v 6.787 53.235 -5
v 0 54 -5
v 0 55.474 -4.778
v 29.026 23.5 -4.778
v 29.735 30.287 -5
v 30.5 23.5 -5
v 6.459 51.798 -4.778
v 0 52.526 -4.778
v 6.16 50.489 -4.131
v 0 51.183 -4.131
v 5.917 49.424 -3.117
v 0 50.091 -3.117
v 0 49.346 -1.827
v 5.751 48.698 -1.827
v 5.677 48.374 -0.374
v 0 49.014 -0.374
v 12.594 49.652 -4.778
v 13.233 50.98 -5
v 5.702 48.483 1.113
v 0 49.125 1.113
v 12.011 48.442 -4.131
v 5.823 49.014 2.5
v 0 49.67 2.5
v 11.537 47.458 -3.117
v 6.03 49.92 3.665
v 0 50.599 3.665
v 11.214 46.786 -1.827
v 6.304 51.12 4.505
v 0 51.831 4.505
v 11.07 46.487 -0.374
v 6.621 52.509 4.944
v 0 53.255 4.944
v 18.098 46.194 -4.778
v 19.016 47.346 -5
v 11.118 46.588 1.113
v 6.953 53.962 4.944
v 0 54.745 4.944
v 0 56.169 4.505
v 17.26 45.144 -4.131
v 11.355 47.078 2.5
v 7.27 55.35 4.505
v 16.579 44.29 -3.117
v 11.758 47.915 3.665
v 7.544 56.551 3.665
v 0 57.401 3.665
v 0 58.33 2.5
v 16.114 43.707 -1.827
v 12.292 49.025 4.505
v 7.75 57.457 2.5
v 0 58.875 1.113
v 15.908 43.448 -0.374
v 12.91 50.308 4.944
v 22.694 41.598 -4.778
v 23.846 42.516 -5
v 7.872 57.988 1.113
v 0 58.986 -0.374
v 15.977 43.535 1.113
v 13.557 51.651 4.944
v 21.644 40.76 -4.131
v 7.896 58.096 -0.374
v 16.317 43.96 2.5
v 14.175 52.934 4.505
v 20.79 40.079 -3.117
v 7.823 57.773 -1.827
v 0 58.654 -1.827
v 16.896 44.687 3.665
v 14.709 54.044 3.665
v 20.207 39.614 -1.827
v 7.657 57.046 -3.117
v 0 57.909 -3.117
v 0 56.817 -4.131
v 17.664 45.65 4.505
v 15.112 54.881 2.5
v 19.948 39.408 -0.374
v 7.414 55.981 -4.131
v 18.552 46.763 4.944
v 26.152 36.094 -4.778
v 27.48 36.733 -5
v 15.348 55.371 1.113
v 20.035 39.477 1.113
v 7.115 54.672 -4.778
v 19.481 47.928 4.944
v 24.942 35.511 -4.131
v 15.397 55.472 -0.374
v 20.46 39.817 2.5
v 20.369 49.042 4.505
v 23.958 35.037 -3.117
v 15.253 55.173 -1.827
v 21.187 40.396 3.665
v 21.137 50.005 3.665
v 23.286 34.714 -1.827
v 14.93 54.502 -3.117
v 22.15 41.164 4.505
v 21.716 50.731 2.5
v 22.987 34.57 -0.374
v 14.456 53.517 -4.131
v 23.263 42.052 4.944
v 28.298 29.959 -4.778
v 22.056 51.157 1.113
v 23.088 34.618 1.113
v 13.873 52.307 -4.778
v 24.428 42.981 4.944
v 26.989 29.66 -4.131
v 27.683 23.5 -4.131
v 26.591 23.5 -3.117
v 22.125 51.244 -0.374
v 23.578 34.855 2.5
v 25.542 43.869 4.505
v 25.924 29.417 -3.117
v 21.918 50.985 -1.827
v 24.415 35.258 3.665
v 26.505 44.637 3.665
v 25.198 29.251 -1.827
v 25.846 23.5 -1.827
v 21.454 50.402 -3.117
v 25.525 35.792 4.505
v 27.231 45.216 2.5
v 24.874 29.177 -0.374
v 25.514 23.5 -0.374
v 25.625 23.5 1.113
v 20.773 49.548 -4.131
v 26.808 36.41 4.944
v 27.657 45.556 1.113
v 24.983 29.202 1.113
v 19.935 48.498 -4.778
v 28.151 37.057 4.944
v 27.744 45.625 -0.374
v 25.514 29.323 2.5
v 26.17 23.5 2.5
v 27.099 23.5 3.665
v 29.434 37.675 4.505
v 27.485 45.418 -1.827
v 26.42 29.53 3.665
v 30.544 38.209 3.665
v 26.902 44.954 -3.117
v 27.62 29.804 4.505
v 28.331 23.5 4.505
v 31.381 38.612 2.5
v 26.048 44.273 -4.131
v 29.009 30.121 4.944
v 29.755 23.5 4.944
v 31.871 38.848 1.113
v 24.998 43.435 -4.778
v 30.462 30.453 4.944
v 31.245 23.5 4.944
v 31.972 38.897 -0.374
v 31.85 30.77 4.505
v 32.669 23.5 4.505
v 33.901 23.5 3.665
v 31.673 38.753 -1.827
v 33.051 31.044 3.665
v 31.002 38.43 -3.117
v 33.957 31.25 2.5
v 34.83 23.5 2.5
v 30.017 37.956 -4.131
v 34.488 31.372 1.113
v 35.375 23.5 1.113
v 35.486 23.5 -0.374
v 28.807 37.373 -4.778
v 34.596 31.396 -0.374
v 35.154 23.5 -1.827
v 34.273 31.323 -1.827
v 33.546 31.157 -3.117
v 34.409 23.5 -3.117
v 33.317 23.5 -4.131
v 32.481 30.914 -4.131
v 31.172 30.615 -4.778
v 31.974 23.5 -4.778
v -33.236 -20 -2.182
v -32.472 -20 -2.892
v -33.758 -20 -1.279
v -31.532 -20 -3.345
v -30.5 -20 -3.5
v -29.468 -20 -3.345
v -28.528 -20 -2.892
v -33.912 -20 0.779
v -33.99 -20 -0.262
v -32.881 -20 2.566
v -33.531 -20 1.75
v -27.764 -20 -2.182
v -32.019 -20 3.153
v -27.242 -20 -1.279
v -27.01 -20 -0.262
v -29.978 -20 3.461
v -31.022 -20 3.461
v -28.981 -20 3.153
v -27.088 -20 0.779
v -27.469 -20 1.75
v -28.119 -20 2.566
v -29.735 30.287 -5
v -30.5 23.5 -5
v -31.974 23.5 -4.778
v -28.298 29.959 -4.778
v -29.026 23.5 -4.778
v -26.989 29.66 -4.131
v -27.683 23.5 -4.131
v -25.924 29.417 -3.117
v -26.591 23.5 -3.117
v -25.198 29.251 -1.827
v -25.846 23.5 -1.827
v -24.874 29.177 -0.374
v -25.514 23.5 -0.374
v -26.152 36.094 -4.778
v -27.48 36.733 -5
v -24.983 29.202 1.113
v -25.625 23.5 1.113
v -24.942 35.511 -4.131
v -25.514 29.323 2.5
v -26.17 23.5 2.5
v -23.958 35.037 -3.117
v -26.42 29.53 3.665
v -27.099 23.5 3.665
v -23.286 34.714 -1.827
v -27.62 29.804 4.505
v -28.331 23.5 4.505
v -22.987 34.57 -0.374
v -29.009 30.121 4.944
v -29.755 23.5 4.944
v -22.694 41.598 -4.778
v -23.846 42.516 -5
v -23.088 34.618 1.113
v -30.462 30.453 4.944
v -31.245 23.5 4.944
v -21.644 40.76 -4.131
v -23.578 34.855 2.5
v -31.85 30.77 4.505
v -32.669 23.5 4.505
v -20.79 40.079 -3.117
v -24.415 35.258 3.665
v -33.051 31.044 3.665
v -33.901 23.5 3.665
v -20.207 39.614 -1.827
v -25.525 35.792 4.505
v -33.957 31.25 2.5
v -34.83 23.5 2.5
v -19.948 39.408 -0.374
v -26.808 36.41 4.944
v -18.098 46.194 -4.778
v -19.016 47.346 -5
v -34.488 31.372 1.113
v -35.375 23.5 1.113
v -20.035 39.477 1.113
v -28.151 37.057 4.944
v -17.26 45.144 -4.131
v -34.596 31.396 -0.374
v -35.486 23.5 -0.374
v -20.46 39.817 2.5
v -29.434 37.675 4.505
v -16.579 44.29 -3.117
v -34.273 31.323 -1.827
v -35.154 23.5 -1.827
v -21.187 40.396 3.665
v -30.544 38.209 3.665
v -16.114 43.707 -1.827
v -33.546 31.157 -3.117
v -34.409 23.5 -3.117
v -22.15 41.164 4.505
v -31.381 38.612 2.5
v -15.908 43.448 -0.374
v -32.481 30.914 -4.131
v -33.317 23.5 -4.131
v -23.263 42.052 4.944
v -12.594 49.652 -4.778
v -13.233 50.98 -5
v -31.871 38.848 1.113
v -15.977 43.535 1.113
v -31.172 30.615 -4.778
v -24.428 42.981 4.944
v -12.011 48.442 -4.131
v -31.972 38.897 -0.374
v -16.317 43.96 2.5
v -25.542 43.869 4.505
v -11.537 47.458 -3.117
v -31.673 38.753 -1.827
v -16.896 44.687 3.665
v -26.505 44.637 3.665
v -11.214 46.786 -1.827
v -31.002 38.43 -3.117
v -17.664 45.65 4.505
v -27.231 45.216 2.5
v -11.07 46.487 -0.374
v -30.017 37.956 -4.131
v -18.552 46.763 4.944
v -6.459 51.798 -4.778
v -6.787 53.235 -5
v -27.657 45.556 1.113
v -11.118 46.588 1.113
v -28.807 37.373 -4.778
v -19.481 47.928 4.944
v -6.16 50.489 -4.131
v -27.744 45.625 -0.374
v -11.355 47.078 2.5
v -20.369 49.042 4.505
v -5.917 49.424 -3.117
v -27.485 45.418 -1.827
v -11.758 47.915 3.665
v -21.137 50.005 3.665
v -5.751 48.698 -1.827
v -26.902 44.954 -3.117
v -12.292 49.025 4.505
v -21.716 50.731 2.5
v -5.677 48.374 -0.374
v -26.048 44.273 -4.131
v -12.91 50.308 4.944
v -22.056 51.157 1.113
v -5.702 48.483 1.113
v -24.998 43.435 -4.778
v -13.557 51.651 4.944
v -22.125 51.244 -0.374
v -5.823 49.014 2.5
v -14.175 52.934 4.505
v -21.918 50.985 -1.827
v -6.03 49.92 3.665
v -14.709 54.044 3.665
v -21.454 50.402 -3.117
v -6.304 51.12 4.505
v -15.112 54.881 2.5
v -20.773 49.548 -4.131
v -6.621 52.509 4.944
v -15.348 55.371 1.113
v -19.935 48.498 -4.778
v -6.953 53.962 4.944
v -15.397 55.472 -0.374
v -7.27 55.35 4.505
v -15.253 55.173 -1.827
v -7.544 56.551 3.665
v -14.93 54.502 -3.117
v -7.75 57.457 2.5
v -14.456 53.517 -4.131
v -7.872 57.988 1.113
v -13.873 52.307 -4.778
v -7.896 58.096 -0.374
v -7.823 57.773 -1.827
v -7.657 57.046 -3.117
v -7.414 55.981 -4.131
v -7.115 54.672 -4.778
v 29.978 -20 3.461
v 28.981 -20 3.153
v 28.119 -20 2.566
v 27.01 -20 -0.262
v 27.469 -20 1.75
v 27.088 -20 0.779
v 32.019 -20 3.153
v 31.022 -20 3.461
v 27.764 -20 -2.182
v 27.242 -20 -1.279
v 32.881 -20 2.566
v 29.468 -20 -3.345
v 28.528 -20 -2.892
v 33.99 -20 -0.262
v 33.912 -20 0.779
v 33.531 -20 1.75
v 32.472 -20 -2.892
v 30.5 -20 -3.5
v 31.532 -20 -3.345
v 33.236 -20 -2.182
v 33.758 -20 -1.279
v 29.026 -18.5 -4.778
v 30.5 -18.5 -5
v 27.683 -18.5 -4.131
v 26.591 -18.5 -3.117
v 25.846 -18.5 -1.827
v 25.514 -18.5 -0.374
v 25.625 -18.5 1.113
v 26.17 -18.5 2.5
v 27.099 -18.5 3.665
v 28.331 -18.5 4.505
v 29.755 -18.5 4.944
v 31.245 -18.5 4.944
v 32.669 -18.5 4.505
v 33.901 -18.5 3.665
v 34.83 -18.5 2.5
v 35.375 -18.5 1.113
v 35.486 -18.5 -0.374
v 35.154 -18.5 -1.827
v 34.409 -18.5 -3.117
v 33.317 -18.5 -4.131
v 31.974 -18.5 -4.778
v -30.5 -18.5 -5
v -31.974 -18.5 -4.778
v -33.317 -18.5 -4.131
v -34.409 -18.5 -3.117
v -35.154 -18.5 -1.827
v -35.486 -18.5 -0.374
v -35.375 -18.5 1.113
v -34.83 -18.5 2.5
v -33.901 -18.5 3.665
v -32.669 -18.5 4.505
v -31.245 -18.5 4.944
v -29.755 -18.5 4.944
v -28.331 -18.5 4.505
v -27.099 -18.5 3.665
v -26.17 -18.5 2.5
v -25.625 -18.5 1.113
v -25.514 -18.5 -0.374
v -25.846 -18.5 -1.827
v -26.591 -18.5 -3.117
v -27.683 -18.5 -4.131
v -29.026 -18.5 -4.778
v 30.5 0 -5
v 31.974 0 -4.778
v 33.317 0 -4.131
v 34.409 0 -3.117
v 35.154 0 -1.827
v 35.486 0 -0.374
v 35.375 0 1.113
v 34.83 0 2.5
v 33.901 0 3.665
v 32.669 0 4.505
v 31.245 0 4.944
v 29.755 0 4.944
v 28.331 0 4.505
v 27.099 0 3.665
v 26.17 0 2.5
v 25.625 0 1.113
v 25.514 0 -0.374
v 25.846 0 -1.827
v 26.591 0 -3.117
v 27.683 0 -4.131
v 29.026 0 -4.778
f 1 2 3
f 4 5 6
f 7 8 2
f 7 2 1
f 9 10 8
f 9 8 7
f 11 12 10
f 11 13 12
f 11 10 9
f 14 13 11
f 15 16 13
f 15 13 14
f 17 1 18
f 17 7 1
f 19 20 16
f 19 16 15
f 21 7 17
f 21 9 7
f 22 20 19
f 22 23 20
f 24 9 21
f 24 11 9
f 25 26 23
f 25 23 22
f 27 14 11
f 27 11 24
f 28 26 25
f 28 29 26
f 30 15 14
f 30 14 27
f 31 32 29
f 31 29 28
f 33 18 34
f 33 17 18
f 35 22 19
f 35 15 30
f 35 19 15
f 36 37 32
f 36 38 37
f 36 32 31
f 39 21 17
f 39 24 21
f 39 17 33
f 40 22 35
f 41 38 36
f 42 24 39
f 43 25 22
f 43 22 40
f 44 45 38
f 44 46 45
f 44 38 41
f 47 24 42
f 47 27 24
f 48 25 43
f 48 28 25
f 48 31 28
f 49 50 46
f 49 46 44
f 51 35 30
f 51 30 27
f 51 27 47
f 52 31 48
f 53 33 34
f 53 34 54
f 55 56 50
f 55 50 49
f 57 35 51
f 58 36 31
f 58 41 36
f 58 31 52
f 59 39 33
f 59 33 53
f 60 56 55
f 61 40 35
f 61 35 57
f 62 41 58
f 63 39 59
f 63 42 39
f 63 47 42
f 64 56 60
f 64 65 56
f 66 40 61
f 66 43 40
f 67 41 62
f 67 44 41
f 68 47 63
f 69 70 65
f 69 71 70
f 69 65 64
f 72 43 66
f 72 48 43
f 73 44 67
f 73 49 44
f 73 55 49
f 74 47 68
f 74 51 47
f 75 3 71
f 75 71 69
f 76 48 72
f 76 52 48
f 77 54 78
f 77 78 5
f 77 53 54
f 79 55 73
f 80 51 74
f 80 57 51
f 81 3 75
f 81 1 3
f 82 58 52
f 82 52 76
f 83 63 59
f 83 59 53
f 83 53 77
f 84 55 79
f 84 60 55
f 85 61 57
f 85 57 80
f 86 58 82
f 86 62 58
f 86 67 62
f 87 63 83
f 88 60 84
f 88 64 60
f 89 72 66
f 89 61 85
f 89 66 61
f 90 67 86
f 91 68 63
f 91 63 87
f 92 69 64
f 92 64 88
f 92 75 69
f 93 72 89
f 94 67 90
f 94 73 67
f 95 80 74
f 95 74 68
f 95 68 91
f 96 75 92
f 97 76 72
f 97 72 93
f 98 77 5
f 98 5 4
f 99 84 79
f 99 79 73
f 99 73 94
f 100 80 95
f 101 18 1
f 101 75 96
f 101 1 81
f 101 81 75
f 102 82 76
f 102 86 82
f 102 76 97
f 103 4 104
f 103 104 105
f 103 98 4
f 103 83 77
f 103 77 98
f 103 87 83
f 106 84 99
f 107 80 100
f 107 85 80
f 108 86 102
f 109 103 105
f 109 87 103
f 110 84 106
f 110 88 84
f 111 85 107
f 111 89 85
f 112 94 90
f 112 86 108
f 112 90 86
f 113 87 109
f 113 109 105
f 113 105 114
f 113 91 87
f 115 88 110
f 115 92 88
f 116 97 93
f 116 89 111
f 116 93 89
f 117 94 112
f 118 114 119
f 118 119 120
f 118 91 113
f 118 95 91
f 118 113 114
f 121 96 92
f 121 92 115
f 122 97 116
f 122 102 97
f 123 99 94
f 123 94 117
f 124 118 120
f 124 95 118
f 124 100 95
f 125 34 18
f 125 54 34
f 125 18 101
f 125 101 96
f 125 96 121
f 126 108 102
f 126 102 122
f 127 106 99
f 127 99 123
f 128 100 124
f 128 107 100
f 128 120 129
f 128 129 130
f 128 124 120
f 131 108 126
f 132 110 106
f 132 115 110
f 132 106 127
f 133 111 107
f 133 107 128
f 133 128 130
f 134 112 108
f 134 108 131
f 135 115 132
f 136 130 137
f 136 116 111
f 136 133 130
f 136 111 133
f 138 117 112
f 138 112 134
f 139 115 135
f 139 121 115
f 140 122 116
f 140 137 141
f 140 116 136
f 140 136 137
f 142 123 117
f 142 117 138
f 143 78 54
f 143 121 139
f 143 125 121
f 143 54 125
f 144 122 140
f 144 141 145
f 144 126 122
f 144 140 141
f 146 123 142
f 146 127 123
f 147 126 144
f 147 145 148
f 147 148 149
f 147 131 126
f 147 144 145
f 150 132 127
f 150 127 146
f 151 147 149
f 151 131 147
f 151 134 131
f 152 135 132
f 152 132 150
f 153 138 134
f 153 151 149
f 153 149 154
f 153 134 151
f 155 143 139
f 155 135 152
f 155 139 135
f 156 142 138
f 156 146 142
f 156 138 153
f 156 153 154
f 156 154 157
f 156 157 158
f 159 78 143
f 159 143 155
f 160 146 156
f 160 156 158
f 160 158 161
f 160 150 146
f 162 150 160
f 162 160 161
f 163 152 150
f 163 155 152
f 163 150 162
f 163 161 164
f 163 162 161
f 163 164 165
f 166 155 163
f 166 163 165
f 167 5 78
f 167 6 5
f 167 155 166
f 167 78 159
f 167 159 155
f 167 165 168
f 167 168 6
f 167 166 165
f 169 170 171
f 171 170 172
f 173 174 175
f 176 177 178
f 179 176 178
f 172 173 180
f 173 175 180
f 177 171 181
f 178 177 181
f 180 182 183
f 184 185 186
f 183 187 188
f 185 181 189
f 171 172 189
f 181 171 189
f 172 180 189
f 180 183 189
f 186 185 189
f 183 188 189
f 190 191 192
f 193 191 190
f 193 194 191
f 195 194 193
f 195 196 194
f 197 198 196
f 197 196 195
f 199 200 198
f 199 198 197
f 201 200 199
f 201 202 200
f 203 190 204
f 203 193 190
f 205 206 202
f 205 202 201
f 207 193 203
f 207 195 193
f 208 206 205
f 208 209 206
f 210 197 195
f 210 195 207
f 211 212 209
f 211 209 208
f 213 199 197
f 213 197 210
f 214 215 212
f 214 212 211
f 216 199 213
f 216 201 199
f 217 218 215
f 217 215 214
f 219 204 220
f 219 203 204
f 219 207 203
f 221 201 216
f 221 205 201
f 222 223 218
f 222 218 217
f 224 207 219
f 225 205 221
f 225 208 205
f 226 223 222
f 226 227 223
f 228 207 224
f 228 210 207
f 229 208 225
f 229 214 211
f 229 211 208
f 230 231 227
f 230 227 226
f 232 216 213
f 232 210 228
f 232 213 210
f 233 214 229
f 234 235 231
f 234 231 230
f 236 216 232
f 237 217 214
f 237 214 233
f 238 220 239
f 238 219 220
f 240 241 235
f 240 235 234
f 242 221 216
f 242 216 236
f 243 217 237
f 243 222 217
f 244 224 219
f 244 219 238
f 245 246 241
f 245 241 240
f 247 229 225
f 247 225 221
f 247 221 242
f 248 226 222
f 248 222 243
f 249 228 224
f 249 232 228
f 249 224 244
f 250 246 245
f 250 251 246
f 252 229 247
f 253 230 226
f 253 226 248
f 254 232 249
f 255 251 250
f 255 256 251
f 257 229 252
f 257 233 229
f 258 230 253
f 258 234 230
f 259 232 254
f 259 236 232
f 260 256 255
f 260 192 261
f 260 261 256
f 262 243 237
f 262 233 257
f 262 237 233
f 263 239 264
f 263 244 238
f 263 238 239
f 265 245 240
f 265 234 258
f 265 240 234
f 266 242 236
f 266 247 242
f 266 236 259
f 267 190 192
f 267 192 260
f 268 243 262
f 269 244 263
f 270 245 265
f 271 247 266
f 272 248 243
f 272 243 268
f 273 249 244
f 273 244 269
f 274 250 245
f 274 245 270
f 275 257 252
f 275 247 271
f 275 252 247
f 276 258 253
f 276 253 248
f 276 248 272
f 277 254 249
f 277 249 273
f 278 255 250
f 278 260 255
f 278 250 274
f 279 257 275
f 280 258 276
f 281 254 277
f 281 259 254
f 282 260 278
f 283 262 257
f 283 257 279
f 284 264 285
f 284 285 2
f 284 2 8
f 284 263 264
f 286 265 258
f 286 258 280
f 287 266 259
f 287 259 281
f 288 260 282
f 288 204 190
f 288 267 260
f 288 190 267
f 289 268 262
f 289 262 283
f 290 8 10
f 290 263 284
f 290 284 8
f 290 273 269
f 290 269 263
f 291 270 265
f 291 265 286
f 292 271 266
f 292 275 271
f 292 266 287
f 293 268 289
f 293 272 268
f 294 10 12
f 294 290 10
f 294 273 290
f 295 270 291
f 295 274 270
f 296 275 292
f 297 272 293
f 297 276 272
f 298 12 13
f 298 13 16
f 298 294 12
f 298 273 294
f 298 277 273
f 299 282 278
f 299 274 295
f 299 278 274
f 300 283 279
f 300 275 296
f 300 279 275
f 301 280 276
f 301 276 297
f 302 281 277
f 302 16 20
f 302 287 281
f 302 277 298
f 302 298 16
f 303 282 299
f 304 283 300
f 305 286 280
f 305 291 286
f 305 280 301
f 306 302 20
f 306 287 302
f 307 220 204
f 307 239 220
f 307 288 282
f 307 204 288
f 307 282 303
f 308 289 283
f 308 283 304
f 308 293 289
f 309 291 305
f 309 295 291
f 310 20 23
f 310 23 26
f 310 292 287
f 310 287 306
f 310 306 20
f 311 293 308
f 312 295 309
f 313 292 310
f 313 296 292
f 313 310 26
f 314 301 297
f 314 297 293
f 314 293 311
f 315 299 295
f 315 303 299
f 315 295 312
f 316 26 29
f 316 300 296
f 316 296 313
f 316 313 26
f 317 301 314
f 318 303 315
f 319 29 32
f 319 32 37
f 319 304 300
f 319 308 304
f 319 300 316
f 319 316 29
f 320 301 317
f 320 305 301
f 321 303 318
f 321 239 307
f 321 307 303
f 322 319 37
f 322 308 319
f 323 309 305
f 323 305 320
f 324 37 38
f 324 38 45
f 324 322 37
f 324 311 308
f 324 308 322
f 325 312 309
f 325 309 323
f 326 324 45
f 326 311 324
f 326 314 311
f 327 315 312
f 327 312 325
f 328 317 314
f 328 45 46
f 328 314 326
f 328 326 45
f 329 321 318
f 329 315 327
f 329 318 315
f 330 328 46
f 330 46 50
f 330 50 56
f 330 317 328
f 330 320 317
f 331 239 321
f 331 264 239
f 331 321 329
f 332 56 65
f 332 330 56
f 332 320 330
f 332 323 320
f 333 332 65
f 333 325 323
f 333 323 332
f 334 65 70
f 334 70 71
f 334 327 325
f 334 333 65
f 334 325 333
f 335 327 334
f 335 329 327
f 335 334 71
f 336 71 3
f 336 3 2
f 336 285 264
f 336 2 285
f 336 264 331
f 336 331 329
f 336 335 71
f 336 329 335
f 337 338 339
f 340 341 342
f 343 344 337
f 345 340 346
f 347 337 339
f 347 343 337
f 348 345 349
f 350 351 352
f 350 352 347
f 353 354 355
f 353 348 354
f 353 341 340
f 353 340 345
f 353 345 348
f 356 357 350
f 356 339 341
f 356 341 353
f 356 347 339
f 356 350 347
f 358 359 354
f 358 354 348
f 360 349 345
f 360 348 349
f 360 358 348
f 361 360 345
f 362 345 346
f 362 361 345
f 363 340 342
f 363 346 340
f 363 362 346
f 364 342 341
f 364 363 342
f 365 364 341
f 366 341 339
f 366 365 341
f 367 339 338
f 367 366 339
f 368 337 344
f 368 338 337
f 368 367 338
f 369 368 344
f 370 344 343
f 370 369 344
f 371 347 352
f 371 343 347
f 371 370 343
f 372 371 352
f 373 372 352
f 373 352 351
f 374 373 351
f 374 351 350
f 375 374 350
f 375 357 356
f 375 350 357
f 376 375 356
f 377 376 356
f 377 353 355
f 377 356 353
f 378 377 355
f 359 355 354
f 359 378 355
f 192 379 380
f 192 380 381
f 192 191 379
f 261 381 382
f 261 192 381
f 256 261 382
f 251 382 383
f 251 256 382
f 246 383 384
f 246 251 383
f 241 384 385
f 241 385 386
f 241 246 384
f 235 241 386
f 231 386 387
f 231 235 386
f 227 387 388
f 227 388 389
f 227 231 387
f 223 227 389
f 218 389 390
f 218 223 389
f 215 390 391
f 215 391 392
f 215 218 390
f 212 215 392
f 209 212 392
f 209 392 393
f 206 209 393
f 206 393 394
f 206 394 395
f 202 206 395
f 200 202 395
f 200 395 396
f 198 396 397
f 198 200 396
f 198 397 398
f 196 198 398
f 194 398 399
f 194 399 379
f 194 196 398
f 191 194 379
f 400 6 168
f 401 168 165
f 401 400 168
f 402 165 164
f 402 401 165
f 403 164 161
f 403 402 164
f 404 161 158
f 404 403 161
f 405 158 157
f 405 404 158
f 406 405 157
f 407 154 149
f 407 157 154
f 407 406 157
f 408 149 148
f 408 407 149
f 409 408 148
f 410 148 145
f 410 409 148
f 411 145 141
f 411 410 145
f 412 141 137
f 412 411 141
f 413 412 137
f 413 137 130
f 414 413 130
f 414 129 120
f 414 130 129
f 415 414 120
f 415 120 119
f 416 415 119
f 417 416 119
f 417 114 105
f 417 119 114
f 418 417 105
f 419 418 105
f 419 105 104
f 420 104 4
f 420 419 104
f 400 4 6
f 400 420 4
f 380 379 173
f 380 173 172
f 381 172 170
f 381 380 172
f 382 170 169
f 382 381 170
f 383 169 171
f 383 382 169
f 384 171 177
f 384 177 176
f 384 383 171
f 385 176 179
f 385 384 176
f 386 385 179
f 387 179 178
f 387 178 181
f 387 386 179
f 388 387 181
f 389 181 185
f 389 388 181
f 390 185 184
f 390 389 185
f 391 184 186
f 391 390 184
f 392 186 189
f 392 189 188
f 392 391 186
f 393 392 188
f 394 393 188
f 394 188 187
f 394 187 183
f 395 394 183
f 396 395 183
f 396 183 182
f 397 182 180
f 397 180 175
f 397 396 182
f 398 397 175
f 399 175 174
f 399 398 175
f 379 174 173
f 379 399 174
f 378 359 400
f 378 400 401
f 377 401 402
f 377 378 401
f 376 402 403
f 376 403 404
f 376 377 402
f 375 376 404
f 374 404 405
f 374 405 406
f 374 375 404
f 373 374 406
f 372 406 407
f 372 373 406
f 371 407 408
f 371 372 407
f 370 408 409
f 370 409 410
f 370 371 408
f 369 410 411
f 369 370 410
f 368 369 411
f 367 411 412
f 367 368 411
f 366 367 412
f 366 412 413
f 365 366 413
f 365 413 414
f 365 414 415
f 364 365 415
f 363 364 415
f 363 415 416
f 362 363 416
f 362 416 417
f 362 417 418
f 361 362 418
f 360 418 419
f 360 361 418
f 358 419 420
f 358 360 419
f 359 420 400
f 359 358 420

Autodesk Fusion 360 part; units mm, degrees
sketch "Sketch1" plane through (0, 0, 0) normal (0, 0, 1) x (1, 0, 0)
  line L0 (0, 0) -> (-100, 0) construction
  line L1 (0, 0) -> (100, 0) construction
  line L2 (0, 0) -> (0, 100) construction
  line L3 (0, 0) -> (0, -100) construction
  circle A0 centre (0, 24.5) radius 24.5 construction
  line L4 (30.5, 0) -> (30.5, -100) construction
  line L5 (30.5, 0) -> (30.5, 100) construction
  line L6 (-30.5, 0) -> (-30.5, -100) construction
  line L7 (-30.5, 0) -> (-30.5, 100) construction
  line L8 (0, 49) -> (0, 54) construction
  line L9 (25.5, 0) -> (25.5, 23.5)
  line L10 (-25.5, 0) -> (-25.5, 23.5)
  line L11 (0, 49) -> (0, 49)
  line L12 (0, 49) -> (0, 49)
  arc A1 (0, 49) -> (-25.5, 23.5) centre (0, 23.5) ccw
  arc A2 (25.5, 23.5) -> (0, 49) centre (0, 23.5) ccw
  line L13 (-25.5, 0) -> (-25.5, -20)
  line L14 (25.5, 0) -> (25.5, -20)
  dimension "d5" = 49
  dimension "d6" = 30.5
  dimension "d7" = 30.5
  dimension "d11" = 25.5
  dimension "d12" = 25.5
  dimension "d13" = 20
  dimension "d14" = 20
sketch "Sketch2" plane through (0, 0, 0) normal (1, 0, 0) x (0, 0, -1)
  circle A0 centre (0, 54) radius 5
  point P0 (0, 49)
  dimension "d15" = 10
sweep "Sweep1" add profiles "Sketch2" path "Sketch1" along L14 L9 A2 A1 L10 L13 section 1
chamfer "Chamfer1" distance 1.5 angle 45 2 edges at (-32.3081, -20, 4.6616) (28.6919, -20, 4.6616)
thread "Thread1"
thread "Thread2"
